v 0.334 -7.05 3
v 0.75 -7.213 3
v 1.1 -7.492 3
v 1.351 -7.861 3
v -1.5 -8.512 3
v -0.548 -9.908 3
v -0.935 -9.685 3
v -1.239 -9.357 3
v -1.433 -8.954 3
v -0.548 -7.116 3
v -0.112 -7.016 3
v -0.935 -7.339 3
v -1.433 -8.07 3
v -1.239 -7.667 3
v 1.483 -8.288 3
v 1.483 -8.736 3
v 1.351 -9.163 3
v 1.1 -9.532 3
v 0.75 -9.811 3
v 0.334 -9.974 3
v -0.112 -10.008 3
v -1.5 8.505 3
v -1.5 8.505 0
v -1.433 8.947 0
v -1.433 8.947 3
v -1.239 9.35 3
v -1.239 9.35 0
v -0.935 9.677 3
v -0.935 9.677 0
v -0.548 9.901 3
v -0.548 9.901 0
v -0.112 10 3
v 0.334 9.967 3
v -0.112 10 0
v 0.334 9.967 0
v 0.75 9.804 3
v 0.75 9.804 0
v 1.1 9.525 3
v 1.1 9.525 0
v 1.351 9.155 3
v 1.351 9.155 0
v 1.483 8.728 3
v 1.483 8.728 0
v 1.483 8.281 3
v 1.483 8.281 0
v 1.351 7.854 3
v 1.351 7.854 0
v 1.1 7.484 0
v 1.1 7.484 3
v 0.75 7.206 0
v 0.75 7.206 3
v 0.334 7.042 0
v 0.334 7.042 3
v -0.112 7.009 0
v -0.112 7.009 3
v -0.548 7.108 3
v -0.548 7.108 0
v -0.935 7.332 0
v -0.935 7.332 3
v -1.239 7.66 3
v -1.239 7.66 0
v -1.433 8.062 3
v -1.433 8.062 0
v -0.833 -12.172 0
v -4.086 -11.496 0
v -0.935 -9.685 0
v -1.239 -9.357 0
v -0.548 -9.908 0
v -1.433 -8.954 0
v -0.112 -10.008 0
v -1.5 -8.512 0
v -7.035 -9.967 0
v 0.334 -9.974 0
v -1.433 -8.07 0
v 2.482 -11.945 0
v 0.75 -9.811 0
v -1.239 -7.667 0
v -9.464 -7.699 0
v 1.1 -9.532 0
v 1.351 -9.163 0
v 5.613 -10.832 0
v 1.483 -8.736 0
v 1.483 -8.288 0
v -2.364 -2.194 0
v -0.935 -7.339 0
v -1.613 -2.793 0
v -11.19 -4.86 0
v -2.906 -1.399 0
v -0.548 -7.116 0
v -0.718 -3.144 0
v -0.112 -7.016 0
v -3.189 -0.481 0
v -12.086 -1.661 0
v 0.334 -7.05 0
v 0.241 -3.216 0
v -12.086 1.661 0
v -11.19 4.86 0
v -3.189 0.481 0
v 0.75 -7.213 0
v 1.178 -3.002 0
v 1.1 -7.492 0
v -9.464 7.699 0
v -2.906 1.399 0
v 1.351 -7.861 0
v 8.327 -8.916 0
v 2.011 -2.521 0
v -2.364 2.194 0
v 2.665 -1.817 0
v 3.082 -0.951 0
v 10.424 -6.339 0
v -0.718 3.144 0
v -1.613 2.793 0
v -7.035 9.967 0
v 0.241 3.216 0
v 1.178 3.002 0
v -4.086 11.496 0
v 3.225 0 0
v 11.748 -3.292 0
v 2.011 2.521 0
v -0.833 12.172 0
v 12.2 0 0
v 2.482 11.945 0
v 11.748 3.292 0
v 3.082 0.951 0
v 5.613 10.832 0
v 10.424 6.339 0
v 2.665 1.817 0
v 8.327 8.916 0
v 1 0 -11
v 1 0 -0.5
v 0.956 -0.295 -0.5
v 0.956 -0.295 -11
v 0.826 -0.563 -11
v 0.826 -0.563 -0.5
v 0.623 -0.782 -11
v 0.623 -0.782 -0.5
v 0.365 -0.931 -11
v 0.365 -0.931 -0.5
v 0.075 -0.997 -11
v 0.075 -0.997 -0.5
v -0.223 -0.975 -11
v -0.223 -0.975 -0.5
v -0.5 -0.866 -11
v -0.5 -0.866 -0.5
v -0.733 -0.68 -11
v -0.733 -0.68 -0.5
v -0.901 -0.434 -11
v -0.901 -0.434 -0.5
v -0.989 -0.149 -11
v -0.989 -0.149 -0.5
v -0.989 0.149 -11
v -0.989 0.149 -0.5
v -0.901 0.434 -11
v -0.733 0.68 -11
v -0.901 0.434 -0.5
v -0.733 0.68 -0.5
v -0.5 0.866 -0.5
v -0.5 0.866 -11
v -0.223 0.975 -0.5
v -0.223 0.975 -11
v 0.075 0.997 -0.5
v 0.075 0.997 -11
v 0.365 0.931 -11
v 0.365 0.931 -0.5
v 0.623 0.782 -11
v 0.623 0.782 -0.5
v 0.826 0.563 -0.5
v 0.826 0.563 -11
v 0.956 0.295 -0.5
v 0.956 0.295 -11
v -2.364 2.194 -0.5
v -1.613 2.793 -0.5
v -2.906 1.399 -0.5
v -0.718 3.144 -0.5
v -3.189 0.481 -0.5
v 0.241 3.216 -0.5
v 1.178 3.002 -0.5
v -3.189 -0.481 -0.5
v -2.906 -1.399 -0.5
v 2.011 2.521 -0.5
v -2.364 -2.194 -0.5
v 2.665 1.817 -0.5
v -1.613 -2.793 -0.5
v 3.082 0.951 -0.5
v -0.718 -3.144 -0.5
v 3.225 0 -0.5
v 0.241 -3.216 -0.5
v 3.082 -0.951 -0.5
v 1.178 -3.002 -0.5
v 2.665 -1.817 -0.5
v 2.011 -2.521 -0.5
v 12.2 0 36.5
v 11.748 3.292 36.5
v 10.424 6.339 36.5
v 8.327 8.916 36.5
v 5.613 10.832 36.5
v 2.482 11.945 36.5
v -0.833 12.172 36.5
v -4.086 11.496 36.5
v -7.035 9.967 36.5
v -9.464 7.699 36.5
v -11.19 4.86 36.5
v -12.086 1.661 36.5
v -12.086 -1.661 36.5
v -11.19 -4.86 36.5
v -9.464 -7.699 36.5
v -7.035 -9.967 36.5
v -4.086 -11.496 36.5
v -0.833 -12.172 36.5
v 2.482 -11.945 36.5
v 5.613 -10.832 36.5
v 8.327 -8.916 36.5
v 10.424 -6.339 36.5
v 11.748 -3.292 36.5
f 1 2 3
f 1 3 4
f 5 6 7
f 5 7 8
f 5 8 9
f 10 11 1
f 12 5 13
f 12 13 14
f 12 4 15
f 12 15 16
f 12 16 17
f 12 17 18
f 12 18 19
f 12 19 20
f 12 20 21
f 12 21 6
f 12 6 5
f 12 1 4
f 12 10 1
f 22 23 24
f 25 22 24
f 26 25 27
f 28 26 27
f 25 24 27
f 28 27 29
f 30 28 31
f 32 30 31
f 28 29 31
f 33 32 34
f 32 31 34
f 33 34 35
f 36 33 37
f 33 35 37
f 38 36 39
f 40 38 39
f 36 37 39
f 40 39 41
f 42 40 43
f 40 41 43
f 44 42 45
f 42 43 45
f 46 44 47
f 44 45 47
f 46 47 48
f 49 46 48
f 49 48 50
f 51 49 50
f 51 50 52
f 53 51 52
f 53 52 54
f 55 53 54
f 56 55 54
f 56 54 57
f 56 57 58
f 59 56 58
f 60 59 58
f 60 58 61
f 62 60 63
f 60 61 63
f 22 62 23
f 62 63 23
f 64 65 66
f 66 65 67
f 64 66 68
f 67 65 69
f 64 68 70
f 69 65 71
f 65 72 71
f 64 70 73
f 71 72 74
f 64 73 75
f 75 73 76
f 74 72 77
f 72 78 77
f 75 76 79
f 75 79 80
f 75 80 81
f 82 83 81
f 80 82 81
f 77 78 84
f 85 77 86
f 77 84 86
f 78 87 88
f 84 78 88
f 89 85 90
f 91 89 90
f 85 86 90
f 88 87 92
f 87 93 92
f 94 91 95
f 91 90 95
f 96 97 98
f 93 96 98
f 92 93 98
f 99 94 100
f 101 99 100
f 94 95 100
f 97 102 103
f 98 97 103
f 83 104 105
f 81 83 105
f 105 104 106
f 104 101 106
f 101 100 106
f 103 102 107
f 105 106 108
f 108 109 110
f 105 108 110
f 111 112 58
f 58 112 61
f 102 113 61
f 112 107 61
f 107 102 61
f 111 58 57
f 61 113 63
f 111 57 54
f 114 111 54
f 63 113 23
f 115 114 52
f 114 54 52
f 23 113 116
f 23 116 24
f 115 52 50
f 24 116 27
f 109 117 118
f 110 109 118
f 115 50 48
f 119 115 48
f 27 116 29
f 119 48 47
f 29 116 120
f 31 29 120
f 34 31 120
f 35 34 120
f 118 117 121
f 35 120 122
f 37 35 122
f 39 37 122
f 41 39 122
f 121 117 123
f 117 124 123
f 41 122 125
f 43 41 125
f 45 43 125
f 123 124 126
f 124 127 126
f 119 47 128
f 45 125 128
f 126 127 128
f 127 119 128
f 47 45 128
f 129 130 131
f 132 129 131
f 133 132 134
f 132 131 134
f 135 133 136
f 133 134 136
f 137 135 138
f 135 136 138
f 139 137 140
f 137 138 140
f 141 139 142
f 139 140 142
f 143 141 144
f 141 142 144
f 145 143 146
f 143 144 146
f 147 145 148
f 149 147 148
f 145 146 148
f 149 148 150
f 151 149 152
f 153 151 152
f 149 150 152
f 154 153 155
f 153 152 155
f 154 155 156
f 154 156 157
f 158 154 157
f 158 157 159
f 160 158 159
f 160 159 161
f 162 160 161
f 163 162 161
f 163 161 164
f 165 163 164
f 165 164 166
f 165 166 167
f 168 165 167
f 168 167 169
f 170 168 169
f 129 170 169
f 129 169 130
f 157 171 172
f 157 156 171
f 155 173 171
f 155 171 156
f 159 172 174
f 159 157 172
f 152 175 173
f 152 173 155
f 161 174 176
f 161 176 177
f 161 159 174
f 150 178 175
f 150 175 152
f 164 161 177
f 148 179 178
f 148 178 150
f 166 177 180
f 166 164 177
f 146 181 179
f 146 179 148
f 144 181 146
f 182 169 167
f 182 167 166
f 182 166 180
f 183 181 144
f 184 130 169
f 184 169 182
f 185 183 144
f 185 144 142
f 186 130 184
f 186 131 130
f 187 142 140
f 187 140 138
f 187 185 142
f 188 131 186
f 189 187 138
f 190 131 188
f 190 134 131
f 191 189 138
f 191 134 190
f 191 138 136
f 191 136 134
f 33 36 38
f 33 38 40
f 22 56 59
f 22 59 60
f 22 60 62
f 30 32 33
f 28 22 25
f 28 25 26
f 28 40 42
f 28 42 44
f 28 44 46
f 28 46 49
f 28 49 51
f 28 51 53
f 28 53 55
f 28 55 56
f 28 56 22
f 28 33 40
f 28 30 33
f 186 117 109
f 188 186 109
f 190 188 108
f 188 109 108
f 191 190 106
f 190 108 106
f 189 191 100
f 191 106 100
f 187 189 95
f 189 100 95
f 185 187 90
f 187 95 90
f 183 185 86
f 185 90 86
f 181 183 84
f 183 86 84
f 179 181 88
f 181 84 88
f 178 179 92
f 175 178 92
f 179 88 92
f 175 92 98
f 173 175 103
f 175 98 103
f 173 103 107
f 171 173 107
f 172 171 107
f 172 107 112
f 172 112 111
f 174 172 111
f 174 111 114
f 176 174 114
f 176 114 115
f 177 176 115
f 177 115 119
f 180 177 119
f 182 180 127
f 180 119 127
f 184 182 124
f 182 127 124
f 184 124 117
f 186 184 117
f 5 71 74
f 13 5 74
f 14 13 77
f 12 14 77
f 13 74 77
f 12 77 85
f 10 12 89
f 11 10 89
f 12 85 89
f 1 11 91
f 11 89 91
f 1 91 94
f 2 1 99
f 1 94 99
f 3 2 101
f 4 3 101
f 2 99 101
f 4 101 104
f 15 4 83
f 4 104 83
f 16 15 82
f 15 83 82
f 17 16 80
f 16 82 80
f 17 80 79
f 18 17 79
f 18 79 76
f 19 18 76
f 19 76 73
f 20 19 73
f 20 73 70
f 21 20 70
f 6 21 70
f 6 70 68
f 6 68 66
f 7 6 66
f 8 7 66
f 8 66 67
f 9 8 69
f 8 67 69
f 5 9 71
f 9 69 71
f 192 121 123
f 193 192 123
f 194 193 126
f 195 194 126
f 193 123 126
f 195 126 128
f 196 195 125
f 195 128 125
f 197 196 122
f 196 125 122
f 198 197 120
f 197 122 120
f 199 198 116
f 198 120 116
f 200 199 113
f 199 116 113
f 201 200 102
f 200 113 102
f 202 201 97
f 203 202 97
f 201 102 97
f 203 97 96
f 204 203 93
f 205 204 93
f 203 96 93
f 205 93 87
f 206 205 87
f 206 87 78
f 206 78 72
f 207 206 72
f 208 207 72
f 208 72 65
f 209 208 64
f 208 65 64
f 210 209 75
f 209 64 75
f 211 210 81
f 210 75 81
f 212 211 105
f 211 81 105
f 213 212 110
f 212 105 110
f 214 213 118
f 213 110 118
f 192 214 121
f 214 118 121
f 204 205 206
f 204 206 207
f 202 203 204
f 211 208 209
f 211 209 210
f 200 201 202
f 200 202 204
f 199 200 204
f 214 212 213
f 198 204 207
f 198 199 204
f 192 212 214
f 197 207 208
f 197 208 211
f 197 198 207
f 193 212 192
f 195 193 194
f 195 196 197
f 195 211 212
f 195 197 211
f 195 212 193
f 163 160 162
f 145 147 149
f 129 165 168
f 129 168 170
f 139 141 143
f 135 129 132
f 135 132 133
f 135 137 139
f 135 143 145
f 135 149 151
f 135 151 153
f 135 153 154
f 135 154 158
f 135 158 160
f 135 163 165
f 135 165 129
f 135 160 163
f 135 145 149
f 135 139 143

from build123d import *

# Parameters (mm, degrees)
SKETCH_1_R          = 12.2
EXTRUDE_4_DEPTH     = 36.5
SKETCH_10_R         = 1
EXTRUDE_7_DEPTH     = 11
SKETCH_11_R         = 3.225
EXTRUDE_8_DEPTH     = 0.5
SKETCH_13_R         = 1.5
CUT_EXTRUDE_2_DEPTH = 3


with BuildPart() as part:
    # 草图1 → 凸台-拉伸4 (new body)
    with BuildSketch(Plane.XY):
        Circle(SKETCH_1_R)
    extrude(amount=EXTRUDE_4_DEPTH)

    # 草图10 → 凸台-拉伸7 (add)
    with BuildSketch(Plane(origin=(0, 0, 0), x_dir=(-1, 0, 0), z_dir=(0, 0, -1))):
        with Locations(Location((0, 0, 0), (0, 0, 180))):
            Circle(SKETCH_10_R)
    extrude(amount=EXTRUDE_7_DEPTH)

    # 草图11 → 凸台-拉伸8 (add)
    with BuildSketch(Plane(origin=(0, 0, 0), x_dir=(-1, 0, 0), z_dir=(0, 0, -1))):
        with Locations(Location((0, 0, 0), (0, 0, 180))):
            Circle(SKETCH_11_R)
    extrude(amount=EXTRUDE_8_DEPTH)

    # 草图13 → 切除-拉伸2 (cut)
    with BuildSketch(Plane(origin=(0, 0, 0), x_dir=(-1, 0, 0), z_dir=(0, 0, -1))):
        with Locations((0, 8.504557186)):
            Circle(SKETCH_13_R)
        with Locations((0, -8.512012438)):
            Circle(SKETCH_13_R)
    extrude(amount=-CUT_EXTRUDE_2_DEPTH, mode=Mode.SUBTRACT)


solid = part.part
